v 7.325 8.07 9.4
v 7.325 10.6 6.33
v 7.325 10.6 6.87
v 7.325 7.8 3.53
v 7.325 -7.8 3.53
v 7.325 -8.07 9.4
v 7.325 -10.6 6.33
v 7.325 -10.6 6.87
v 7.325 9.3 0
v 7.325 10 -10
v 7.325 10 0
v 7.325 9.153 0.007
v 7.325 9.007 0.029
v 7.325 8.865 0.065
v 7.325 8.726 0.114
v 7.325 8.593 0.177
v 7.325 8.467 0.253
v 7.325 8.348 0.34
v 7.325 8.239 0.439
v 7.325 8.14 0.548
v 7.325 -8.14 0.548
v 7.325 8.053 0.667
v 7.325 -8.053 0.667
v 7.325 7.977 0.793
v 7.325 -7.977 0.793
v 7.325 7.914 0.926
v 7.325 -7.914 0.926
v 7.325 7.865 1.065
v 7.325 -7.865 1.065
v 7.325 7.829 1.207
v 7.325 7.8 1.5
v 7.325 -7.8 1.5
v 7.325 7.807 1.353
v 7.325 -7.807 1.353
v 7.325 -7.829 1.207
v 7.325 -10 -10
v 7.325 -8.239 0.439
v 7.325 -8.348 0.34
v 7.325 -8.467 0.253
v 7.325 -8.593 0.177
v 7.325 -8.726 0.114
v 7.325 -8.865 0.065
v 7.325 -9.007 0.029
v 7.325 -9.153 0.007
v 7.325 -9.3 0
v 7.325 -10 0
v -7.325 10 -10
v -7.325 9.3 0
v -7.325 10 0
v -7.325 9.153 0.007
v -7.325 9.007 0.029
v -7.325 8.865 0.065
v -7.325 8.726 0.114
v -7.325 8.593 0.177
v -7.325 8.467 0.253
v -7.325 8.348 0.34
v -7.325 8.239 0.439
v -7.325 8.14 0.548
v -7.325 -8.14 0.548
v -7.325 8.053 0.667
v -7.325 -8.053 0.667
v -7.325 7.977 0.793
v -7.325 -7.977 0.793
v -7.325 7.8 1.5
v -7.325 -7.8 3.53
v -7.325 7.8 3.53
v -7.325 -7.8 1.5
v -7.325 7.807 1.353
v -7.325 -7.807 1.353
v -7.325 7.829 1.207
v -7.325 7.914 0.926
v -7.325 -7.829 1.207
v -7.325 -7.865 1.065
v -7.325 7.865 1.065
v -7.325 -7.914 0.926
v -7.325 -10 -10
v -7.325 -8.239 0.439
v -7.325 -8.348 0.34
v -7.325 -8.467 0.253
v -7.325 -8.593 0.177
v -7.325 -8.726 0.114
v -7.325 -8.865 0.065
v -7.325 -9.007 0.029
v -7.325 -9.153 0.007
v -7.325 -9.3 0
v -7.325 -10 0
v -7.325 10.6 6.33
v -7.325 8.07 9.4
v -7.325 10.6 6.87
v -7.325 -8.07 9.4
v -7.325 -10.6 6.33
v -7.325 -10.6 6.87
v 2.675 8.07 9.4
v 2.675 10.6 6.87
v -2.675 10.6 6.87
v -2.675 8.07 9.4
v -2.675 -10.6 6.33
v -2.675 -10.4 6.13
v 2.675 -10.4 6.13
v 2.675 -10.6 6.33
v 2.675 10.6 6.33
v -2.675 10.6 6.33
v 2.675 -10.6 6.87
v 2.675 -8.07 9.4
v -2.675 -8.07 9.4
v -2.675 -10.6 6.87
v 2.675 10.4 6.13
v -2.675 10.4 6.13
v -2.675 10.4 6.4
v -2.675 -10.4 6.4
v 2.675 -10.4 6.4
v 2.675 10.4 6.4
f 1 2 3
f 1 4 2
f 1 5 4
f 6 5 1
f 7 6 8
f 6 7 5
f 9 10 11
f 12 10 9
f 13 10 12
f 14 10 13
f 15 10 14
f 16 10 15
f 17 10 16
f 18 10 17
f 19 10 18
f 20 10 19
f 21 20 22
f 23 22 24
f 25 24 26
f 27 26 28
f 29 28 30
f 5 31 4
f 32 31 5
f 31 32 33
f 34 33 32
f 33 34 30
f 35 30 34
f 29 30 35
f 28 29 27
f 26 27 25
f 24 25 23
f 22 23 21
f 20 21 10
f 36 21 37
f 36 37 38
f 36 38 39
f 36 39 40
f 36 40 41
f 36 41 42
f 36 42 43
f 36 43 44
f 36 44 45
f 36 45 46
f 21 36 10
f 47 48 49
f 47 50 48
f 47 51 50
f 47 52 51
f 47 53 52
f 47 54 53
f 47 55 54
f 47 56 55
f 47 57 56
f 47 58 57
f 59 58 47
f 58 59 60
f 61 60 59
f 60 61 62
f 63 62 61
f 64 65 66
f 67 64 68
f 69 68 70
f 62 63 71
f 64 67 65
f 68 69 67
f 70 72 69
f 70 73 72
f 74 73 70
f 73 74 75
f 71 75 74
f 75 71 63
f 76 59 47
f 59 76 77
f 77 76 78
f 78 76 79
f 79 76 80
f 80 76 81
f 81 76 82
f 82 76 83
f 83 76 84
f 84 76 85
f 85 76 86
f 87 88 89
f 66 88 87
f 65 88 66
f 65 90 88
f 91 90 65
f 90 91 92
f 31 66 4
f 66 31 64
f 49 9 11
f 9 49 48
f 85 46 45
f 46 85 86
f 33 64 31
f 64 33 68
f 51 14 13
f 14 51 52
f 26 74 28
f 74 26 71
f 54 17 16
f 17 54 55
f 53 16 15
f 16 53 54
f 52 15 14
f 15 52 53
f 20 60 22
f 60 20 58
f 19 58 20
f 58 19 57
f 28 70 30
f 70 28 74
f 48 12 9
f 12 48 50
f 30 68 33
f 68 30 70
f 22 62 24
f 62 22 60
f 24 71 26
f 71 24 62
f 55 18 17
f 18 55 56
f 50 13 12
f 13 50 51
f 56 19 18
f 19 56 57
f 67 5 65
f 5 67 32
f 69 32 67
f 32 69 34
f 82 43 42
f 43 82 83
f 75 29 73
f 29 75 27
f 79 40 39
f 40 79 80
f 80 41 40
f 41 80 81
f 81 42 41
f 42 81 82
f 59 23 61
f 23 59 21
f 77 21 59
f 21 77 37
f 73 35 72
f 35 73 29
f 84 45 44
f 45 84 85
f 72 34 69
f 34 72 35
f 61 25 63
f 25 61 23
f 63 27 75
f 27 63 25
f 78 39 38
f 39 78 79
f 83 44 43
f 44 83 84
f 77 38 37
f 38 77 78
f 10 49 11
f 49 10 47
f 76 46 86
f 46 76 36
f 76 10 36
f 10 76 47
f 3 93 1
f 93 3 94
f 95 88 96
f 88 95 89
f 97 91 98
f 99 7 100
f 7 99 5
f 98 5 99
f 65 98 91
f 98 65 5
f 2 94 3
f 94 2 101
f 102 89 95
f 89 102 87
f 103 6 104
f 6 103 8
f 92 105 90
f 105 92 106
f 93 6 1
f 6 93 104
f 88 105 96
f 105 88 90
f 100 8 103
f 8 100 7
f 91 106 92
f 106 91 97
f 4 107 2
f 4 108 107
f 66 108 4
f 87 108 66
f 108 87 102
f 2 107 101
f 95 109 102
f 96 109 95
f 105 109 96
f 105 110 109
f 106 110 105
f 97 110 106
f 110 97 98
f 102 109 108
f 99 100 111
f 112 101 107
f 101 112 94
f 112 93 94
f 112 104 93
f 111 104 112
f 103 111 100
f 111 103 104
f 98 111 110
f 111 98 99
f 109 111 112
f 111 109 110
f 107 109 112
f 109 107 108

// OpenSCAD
// Slightly modified from original so that the base height can be
// specified on the call.

nato_rail (1, true, 10);


    module nato_rail (n, has_base, railBaseHeight=5)
    {
        ws = 5.35;

        h0 = railBaseHeight;
        h1 = 3.53;
        h2 = 5.87;
        h3 = 3;

        w0 = 20;
        w1 = 15.6;
        
        l = 10 * (n + 1) - ws;
        
        translate ([0, 0, - h0])
        rotate ([90, 0, 90])
        translate ([0, 0, -l/2])
        rail(h0, h1, l, w0, w1);
        
        
        module rail(h0, h1, l, w0, w1)
        {
            difference ()
            {
                union ()
                {
                    railbase(h0, h1, l, w0, w1, has_base);
                    translate ([0, h0 + h1, 0])
                    railprism (l);
                };
                union ()
                {
                    for (i = [1:1:n]) {
                        translate ([0, h0 + h1, 10 * i - ws])
                        railslot(ws);
                    }
                };
            };
        };

        module railbase (h0, h1, l, w0, w1, has_base)
        {
            if (has_base) {
                translate ([0, h0 / 2, l/2])
                cube ([w0, h0, l], center = true);
                mirror([1,0,0])
                basefillet (h0, l, w1);
                basefillet (h0, l, w1);
            }
            translate ([0, h0 + h1 / 2, l/2])
            cube ([w1, h1, l], center = true);
        }
        
        module basefillet (h0, l, w1)
        {
        difference() {
                translate ([w1 / 2, h0, 0])
                cube ([1.5, 1.5, l]);
                translate ([w1 / 2 + 1.5, h0 + 1.5, l / 2])
                cylinder (l+1, 1.5, 1.5, $fn=64, center = true);
            }
        }
        
        module railprism (l)
        {
            linear_extrude (height = l, convexity = 10)
            polygon (points = [[7.8, 0], [10.6, 2.8], [10.6, 3.34], [8.07, 5.87], [-8.07, 5.87], [-10.6, 3.34], [-10.6, 2.8], [-7.8, 0]], convexity = 10);
        }
        
        module railslot (l)
        {
            linear_extrude (height = l, convexity = 10)
            polygon (points = [[11, 6], [11, 2.65], [10.4, 2.6], [10.4, 2.87], [-10.4, 2.87], [-10.4, 2.6], [-11, 2.65], [-11, 6]], convexity = 10);
        }
        
    }
